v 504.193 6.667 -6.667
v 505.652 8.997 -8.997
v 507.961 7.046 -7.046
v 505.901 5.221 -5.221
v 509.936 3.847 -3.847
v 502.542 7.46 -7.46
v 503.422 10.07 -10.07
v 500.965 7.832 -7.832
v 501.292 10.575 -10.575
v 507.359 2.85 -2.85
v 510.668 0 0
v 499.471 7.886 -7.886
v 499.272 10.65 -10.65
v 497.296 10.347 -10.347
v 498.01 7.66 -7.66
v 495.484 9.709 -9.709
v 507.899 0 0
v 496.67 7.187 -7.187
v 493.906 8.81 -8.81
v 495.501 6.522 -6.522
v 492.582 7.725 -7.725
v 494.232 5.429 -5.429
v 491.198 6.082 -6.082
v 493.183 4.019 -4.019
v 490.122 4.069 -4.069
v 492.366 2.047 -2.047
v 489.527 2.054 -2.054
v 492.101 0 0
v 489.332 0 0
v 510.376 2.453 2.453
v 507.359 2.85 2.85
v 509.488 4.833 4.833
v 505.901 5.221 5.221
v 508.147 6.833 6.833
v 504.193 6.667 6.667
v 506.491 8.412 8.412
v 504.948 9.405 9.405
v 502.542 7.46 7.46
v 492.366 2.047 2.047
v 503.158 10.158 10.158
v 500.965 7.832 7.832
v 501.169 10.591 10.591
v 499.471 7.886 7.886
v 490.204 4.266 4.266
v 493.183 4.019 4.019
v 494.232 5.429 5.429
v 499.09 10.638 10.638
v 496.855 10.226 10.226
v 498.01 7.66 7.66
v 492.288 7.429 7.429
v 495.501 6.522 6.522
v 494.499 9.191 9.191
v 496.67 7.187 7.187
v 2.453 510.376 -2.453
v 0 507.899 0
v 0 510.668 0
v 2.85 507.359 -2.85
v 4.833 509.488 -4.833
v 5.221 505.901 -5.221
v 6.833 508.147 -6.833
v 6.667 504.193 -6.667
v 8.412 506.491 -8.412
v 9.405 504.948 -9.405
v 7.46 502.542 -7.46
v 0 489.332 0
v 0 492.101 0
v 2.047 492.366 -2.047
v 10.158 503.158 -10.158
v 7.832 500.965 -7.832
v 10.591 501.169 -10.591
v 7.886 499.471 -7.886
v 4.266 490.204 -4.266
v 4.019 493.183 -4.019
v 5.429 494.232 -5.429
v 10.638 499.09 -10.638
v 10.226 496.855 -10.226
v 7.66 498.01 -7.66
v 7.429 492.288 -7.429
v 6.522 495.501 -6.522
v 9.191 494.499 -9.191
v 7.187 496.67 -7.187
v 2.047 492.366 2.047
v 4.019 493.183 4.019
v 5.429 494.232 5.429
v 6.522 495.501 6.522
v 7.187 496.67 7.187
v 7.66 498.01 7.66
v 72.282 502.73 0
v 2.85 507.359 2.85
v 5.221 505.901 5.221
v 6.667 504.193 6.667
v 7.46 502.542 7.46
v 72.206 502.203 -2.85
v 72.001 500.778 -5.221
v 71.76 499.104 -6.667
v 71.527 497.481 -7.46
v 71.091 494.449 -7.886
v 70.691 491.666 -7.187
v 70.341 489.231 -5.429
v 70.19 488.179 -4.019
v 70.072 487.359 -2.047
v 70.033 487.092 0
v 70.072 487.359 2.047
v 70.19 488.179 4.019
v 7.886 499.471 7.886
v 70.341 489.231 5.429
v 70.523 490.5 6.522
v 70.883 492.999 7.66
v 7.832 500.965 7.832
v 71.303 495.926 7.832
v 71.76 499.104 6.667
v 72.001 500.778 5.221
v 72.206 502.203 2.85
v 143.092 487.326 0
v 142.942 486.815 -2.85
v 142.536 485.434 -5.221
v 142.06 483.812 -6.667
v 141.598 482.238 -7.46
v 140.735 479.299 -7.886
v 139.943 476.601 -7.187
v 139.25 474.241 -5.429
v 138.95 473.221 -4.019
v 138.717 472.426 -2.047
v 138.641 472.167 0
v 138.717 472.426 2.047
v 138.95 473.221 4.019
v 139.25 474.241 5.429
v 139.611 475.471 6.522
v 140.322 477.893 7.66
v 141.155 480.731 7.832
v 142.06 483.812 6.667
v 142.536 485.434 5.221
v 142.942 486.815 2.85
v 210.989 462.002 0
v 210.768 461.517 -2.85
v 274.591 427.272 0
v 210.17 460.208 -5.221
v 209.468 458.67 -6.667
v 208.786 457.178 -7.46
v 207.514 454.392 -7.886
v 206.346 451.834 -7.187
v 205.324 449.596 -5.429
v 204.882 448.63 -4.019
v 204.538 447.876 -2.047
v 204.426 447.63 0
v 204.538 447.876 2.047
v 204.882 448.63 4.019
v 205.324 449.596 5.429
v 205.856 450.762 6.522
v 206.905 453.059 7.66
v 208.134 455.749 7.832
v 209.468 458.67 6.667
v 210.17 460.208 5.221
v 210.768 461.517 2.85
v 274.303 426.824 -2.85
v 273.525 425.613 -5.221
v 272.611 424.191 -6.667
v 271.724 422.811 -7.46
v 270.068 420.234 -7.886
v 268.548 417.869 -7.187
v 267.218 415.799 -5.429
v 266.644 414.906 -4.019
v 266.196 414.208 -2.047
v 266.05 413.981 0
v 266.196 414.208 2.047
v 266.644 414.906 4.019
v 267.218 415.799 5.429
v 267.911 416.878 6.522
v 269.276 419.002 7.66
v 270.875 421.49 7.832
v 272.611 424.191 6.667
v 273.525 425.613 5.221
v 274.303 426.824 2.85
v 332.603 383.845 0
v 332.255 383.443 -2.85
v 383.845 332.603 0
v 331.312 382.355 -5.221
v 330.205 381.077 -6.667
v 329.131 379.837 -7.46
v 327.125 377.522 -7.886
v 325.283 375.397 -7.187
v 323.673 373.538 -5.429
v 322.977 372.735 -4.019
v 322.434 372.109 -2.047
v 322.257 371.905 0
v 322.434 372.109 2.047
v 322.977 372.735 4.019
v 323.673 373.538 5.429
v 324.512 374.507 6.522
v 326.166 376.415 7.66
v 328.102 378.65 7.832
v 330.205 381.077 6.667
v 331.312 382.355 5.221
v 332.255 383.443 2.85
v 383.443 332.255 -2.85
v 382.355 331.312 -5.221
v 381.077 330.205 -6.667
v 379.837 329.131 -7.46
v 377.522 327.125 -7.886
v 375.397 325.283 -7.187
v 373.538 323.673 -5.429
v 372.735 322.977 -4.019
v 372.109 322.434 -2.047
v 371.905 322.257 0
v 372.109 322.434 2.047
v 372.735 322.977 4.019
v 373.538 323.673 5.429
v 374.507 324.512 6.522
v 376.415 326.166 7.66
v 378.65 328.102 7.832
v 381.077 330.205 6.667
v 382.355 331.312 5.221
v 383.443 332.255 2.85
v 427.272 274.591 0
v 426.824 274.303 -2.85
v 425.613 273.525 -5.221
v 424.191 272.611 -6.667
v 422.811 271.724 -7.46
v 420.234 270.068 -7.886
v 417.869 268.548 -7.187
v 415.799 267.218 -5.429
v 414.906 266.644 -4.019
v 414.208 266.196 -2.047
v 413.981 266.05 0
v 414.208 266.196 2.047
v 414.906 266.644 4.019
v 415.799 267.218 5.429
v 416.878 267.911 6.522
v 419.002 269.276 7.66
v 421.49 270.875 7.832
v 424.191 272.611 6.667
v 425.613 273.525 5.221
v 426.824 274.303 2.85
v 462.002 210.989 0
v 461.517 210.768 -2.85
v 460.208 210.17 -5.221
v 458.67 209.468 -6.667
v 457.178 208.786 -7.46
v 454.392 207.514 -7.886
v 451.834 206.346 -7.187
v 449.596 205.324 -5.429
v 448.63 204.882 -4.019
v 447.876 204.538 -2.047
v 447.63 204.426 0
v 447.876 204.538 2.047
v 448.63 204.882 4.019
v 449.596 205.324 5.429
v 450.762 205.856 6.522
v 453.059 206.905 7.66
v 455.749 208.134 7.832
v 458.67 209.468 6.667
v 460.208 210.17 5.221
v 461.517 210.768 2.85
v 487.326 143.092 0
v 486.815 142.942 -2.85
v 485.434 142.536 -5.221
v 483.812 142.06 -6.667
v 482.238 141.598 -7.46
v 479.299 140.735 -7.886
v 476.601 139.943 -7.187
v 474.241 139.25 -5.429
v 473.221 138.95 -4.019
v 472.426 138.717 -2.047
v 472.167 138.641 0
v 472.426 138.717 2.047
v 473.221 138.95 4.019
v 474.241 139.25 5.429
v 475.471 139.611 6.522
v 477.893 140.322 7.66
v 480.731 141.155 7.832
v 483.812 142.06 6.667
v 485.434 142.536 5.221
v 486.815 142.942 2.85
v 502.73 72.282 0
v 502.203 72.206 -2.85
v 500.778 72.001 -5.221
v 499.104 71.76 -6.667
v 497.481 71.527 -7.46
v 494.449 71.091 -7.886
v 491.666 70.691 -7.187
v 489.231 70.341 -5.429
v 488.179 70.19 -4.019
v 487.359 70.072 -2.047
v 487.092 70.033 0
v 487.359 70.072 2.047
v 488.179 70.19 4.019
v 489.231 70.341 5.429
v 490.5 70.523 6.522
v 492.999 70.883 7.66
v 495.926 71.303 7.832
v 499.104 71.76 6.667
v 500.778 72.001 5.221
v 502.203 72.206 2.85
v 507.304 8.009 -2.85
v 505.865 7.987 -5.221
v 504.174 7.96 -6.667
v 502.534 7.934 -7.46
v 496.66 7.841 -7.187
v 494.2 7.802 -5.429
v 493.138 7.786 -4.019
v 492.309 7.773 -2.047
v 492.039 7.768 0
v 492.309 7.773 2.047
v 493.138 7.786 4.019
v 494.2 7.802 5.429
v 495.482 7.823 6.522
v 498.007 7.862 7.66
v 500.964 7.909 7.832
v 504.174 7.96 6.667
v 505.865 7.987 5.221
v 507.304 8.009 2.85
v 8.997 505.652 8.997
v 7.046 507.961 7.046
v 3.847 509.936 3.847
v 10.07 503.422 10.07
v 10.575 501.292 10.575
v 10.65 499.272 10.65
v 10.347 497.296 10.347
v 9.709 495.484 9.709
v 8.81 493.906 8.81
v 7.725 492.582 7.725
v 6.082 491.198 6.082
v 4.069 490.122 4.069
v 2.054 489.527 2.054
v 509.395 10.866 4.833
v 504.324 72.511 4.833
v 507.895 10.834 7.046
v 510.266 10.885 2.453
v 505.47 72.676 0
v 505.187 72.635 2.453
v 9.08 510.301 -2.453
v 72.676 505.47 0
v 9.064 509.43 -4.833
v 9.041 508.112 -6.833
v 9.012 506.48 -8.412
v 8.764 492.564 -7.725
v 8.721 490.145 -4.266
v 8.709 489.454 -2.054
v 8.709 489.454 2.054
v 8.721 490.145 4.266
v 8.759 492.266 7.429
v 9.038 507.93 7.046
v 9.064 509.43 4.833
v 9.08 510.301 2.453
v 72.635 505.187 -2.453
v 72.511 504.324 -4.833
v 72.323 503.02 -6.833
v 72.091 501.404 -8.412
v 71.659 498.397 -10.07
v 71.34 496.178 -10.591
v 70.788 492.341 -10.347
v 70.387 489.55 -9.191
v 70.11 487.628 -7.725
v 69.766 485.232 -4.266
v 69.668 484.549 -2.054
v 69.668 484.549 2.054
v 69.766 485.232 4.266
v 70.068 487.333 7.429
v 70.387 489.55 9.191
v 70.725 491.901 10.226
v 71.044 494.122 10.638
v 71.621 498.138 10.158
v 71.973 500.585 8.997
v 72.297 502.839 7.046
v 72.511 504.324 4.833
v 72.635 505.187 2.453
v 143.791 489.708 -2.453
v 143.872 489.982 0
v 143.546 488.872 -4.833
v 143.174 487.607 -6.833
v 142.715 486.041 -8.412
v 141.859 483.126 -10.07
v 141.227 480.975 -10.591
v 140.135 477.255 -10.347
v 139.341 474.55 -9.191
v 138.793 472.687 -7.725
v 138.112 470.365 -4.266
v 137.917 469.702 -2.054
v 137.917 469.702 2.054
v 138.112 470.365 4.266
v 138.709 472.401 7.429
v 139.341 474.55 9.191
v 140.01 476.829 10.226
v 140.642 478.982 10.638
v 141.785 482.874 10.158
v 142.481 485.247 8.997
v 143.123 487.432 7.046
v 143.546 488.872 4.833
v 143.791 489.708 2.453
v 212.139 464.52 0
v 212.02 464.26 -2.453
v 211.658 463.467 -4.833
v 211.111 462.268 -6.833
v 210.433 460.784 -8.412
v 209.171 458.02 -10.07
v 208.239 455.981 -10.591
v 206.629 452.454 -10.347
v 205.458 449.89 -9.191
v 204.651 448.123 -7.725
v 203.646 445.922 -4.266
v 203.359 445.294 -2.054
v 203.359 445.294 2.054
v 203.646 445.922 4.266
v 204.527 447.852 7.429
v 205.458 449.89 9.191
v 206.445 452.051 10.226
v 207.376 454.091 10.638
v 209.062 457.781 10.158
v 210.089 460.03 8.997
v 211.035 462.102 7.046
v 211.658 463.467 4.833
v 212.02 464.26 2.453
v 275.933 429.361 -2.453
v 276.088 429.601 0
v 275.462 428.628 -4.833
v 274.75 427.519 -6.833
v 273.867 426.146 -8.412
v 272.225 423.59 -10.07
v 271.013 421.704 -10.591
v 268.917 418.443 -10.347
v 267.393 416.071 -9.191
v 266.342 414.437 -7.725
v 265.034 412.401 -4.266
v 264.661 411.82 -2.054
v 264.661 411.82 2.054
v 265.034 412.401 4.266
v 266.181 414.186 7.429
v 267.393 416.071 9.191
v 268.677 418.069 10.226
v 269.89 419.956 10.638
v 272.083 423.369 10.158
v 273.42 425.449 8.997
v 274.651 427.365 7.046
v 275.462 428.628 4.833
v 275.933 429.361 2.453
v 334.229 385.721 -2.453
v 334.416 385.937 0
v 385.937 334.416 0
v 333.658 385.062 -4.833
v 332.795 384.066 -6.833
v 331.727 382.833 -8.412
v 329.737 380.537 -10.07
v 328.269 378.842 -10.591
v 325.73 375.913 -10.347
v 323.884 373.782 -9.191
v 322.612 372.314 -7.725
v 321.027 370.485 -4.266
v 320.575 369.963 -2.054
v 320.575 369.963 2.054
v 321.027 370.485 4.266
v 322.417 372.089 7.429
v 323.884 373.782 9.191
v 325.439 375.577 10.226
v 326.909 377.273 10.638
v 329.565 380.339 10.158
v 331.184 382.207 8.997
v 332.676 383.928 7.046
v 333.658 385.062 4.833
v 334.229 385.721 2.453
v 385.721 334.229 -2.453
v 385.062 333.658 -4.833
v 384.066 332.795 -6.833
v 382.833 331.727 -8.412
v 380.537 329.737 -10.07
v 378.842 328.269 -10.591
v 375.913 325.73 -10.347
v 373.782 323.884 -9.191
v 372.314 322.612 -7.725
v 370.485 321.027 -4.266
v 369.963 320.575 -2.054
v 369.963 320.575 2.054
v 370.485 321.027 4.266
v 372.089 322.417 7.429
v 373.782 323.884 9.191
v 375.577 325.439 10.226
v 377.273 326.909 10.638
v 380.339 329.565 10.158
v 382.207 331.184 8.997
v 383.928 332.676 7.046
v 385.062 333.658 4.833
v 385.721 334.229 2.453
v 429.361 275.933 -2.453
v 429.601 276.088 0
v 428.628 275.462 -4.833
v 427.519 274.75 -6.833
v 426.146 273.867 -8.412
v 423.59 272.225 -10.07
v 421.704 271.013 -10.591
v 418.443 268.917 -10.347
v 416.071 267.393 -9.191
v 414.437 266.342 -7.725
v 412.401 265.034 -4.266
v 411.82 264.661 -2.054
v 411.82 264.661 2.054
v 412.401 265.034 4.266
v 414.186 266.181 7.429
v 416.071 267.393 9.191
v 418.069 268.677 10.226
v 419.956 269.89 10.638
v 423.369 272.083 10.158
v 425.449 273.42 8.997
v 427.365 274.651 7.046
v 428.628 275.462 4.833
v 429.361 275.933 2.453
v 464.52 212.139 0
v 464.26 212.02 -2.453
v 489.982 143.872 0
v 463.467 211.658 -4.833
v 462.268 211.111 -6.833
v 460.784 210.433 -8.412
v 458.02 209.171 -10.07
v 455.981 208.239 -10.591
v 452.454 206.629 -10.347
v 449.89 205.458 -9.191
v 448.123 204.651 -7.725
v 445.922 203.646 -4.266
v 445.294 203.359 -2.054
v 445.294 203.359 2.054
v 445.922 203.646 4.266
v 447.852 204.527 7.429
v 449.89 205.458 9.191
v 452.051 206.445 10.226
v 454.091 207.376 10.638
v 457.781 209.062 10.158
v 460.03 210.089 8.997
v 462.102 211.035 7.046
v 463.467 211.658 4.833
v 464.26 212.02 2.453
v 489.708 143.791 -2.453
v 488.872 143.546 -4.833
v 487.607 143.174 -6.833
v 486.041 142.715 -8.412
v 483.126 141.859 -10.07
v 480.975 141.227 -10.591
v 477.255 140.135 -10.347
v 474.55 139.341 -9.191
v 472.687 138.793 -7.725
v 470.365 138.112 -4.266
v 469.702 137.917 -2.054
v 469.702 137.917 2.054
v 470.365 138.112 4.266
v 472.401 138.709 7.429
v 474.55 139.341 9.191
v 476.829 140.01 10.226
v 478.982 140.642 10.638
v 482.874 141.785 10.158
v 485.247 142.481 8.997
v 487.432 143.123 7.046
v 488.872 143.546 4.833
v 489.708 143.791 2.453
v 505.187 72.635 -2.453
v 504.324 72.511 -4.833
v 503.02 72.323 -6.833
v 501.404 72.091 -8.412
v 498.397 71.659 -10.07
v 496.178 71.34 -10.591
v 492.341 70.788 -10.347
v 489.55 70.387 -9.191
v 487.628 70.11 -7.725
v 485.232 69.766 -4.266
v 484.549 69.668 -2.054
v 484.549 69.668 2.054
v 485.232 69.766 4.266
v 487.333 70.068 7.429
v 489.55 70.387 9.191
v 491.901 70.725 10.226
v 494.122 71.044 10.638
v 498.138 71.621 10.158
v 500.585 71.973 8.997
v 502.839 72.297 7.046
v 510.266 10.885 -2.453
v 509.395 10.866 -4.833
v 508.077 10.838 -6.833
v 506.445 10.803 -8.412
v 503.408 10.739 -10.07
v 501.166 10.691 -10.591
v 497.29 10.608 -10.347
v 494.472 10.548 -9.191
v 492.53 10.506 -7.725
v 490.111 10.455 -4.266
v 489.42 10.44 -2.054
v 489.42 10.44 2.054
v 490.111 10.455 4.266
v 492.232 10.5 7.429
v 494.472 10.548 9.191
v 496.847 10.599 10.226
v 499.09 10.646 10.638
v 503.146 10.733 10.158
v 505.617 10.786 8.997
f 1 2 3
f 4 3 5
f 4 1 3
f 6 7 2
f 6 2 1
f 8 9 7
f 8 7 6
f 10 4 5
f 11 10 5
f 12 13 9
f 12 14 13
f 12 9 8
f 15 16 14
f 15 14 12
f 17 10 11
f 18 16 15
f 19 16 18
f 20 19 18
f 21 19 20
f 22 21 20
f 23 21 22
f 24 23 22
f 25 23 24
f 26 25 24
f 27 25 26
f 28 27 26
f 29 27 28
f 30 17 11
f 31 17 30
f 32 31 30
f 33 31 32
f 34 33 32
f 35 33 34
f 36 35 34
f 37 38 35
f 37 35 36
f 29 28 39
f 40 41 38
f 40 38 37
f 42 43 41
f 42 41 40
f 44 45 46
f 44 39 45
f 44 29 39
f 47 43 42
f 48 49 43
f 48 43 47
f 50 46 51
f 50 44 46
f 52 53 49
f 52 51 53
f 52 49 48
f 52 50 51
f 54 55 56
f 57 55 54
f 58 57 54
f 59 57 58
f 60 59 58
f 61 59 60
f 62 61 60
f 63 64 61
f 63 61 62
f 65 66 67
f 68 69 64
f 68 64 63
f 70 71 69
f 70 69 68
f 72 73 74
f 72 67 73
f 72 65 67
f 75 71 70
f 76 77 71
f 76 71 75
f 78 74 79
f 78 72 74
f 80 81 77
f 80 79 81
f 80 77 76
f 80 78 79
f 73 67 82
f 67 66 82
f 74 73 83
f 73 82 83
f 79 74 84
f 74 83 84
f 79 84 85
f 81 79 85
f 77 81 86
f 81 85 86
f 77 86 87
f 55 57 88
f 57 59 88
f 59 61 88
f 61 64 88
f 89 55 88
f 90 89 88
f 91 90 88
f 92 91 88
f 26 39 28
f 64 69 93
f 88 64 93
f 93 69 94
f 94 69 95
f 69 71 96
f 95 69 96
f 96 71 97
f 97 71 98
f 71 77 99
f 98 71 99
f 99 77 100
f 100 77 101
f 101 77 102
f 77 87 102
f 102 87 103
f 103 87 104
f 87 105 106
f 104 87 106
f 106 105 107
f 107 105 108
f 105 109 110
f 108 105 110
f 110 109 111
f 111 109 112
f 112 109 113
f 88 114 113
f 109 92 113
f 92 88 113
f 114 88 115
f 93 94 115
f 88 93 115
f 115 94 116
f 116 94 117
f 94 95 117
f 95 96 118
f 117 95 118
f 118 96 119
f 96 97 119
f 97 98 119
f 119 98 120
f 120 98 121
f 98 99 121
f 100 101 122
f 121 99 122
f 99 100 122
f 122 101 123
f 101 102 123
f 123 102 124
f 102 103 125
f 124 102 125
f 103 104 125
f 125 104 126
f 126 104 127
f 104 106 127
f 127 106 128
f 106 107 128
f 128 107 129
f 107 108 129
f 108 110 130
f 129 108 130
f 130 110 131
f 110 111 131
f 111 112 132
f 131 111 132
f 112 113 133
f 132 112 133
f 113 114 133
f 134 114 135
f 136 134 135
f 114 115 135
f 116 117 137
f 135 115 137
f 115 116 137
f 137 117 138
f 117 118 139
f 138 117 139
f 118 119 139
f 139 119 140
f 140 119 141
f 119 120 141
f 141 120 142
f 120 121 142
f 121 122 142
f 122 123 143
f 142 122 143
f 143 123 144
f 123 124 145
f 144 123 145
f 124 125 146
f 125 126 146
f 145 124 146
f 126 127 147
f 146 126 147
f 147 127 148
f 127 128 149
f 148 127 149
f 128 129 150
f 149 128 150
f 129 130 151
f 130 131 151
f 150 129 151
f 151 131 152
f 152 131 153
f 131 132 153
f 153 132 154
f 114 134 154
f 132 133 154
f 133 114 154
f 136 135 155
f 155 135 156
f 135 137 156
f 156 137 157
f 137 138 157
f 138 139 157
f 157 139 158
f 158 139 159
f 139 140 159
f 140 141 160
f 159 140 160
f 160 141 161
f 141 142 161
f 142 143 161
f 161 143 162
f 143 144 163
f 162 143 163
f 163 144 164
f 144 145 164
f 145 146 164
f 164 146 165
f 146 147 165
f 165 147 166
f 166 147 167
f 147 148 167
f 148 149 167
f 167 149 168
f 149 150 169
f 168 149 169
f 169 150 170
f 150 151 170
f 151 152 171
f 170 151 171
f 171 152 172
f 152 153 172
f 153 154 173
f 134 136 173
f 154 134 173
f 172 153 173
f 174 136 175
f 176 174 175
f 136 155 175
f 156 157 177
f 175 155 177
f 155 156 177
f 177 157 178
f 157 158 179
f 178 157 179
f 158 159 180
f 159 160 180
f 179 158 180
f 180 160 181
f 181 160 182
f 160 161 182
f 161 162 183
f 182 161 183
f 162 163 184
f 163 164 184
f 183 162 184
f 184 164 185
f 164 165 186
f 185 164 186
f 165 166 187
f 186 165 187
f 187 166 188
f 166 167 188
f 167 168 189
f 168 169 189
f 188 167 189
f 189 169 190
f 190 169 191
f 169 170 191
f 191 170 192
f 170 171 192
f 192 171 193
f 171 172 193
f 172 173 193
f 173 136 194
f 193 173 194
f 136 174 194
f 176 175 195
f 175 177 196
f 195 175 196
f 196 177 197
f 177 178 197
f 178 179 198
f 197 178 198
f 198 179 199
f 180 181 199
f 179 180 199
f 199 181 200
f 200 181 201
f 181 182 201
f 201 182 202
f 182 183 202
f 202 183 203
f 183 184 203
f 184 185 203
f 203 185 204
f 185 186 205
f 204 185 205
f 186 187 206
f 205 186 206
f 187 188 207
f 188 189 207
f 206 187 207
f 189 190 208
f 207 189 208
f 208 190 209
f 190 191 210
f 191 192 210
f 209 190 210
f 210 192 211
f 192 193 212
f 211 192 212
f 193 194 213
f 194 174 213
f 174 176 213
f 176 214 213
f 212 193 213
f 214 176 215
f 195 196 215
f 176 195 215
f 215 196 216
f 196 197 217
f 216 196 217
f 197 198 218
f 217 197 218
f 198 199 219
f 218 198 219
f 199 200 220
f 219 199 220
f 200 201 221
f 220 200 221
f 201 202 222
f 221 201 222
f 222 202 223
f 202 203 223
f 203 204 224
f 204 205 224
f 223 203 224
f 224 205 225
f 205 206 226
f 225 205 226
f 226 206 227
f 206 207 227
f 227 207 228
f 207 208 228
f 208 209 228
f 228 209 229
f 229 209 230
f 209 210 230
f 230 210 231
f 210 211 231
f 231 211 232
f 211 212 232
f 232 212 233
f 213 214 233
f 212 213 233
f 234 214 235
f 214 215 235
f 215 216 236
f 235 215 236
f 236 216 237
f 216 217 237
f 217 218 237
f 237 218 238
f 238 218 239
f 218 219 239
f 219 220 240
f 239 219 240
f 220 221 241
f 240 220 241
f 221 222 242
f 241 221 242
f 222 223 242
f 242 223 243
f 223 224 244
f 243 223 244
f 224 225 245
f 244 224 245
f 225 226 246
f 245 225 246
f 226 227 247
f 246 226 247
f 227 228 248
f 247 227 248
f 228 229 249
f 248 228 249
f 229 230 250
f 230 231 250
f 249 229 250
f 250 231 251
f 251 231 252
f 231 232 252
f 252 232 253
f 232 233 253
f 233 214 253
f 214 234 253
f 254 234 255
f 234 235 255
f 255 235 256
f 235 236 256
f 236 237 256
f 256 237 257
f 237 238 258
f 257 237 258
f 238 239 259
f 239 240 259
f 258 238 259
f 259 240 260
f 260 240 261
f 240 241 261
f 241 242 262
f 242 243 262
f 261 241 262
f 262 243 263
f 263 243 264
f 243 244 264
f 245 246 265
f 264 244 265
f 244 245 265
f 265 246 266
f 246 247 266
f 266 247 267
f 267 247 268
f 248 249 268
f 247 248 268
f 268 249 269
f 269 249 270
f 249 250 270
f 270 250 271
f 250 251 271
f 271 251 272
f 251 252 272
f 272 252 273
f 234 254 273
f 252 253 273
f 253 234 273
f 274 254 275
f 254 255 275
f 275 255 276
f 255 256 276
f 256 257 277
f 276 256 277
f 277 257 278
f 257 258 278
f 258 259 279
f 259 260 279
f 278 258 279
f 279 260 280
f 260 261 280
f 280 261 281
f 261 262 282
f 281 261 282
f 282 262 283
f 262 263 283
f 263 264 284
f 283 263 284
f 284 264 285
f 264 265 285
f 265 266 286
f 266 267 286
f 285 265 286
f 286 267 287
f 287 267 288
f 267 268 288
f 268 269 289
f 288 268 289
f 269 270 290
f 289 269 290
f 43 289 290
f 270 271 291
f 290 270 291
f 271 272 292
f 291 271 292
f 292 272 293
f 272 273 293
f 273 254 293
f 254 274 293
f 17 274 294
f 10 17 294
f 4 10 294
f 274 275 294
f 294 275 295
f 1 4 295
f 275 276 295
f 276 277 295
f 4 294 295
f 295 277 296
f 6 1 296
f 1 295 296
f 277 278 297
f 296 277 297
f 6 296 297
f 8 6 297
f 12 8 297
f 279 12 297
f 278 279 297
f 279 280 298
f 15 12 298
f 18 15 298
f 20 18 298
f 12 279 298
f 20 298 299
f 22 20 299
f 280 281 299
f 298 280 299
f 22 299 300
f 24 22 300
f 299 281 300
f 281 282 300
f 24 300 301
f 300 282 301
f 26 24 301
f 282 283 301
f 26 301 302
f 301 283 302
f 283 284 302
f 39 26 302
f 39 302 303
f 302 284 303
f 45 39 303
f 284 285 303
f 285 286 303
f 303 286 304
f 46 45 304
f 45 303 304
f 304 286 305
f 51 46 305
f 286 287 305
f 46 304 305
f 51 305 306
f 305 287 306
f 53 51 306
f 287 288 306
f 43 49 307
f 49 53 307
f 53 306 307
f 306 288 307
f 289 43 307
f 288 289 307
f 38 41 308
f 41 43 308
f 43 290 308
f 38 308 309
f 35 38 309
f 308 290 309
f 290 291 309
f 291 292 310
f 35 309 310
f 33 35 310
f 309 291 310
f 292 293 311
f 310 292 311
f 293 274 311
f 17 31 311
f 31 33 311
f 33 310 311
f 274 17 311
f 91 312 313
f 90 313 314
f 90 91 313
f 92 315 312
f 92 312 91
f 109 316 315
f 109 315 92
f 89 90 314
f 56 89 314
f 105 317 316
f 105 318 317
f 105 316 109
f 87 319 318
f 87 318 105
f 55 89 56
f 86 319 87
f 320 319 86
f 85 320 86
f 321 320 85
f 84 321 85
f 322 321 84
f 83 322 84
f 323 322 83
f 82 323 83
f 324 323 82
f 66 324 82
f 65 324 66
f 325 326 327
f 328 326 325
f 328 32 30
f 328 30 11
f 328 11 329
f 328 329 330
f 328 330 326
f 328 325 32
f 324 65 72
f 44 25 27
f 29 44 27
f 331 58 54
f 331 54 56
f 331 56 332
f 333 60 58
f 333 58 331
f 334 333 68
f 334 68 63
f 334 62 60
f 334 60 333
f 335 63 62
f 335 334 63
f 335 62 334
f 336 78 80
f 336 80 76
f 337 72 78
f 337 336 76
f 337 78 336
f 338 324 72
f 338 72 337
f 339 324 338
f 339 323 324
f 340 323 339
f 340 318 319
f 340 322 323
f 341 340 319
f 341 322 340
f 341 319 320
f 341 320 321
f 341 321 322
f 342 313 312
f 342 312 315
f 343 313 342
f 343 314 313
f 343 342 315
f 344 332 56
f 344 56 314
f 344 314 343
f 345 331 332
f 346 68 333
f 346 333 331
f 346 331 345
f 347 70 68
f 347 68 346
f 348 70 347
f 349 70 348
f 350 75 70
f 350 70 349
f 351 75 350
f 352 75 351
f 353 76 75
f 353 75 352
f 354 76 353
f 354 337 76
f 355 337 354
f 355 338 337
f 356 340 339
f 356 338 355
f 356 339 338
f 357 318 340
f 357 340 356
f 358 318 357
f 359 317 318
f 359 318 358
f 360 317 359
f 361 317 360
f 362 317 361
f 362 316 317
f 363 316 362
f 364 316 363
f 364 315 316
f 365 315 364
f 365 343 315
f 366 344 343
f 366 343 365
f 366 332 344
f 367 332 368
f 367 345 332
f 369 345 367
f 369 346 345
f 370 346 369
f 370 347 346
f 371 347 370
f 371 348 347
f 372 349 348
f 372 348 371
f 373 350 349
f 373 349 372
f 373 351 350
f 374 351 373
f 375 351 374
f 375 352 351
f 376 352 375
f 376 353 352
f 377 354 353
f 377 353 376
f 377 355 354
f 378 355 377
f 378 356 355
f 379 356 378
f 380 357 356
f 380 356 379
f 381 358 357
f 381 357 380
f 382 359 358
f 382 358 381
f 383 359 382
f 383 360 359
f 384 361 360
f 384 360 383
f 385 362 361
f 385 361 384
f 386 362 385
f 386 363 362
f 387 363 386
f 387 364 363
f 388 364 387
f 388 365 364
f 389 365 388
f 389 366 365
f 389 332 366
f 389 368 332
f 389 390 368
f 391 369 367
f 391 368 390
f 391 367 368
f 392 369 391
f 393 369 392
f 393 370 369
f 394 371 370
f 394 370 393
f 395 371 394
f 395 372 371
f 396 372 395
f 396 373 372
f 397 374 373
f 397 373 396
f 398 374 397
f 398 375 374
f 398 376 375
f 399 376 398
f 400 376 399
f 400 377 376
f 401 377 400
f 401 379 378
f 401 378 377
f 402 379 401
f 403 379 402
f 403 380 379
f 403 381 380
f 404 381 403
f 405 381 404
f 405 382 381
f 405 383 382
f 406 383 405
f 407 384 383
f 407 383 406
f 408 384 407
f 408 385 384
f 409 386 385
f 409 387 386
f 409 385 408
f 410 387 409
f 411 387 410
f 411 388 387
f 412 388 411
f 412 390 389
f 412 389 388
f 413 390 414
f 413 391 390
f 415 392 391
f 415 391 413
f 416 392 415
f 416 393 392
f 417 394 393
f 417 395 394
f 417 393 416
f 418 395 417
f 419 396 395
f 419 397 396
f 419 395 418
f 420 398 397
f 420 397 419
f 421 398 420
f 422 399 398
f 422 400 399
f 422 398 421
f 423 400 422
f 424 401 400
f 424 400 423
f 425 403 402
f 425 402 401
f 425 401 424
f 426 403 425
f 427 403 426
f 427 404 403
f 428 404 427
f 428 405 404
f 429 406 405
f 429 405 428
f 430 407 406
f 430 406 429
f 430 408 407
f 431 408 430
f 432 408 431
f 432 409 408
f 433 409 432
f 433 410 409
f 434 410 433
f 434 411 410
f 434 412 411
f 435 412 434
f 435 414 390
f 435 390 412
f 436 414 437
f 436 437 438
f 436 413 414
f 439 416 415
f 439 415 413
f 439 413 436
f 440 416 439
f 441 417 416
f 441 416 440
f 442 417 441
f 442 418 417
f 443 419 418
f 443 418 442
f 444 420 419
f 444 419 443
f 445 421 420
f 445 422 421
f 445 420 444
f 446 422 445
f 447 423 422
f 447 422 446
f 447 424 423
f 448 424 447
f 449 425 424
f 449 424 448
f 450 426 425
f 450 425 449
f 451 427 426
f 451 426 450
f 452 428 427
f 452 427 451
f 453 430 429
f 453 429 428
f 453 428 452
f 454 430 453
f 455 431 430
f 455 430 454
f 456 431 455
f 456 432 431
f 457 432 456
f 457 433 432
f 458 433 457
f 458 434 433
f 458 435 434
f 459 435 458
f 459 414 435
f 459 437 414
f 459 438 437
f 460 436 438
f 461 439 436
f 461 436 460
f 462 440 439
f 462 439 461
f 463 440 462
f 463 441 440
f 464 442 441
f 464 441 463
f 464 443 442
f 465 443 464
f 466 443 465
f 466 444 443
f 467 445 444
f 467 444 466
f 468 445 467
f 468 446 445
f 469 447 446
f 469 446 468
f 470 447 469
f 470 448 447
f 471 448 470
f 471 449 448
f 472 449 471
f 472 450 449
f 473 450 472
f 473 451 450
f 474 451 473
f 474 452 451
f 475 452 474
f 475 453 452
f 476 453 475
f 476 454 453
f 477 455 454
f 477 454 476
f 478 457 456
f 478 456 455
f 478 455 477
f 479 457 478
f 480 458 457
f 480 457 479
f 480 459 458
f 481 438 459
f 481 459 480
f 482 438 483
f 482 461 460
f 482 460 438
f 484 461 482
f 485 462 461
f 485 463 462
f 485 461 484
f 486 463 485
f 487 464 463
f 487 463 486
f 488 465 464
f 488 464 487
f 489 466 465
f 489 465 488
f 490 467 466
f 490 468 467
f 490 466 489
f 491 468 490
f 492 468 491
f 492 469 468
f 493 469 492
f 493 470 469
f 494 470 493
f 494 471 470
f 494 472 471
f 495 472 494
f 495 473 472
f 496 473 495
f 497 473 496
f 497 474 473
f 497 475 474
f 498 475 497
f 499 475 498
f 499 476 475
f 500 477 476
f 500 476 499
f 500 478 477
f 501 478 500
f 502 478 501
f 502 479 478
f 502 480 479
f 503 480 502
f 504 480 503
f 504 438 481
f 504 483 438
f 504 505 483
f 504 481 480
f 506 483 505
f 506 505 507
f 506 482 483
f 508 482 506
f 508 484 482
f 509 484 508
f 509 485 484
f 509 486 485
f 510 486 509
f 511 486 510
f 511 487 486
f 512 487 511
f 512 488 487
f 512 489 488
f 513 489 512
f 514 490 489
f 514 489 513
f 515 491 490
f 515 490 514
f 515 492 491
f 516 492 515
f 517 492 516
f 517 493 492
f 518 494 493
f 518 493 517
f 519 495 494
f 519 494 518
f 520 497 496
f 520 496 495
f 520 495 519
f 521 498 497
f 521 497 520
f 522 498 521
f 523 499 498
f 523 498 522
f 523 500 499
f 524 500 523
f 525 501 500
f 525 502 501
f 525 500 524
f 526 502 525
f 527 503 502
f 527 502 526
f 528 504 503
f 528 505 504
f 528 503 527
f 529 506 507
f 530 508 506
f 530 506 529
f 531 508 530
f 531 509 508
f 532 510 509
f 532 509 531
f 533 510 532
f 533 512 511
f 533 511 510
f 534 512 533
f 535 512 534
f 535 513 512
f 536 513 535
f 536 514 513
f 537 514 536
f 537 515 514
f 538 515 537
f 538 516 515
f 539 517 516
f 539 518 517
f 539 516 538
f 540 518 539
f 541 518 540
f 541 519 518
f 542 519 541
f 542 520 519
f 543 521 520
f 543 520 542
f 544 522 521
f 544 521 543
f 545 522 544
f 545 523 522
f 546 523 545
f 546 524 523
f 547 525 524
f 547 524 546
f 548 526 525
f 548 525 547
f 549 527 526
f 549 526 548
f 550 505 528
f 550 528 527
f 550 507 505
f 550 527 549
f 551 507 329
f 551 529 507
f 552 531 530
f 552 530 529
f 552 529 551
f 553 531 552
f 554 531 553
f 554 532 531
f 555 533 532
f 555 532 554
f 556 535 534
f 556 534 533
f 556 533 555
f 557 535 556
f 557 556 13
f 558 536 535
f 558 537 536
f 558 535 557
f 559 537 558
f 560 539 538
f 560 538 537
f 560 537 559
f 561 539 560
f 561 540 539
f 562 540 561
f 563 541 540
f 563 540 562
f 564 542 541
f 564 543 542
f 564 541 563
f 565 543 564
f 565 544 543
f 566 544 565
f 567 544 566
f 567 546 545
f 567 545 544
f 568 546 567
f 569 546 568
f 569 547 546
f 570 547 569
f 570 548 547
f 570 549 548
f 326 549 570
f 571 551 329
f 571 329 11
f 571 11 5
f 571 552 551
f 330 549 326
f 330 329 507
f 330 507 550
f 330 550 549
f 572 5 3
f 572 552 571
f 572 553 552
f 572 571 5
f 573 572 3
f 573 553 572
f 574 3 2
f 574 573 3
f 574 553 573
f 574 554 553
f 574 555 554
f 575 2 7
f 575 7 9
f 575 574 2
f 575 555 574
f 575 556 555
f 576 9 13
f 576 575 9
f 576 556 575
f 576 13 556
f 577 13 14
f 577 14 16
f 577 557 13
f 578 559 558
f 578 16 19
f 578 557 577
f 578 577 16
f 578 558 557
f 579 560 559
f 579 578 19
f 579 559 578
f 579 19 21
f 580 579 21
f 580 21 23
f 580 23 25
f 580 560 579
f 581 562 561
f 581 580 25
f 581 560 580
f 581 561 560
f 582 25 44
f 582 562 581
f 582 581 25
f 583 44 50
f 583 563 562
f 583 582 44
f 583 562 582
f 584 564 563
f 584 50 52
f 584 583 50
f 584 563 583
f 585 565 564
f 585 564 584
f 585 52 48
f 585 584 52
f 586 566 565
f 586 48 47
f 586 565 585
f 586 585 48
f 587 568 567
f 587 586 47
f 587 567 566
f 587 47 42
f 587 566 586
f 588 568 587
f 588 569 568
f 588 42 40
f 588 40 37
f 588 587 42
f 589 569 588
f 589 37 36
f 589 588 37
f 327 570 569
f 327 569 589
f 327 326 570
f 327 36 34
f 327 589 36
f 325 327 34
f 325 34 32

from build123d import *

# Parameters (mm, degrees)
SKETCH2_R          = 10.668
SKETCH2_R_2        = 7.8994
CUT_EXTRUDE2_DEPTH = 723.272399361
CUT_EXTRUDE4_START = 489.220558
CUT_EXTRUDE4_DEPTH = 21.447442


with BuildPart() as part:
    # Sweep1: sweep along a path in Sketch1
    with BuildLine(Plane.XY) as sweep1_path:
        ThreePointArc((0, 500), (353.553390593, 353.553390593), (500, 0))
    # Sketch2 → Sweep1 (sweep)
    with BuildSketch(Plane(origin=(0, 0, 0), x_dir=(1, 0, 0), z_dir=(0, 1, 0))):
        with Locations((500, 0)):
            Circle(SKETCH2_R)
        with Locations((500, 0)):
            Circle(SKETCH2_R_2, mode=Mode.SUBTRACT)
    sweep(path=sweep1_path.line)

    # Sketch4 → Cut-Extrude2 (cut, through all)
    with BuildSketch(Plane(origin=(0, 0, 0), x_dir=(0, 0, -1), z_dir=(1, 0, 0))):
        Polygon((0, 0), (-10.668, 10.668), (-10.668, -2.04612568), (10.668, -2.04612568), (10.668, 10.668), align=None)
    extrude(amount=CUT_EXTRUDE2_DEPTH, mode=Mode.SUBTRACT)

    # Sketch3 → Cut-Extrude4 (cut)
    with BuildSketch(Plane(origin=(0, 0, 0), x_dir=(1, 0, 0), z_dir=(0, 1, 0)).offset(CUT_EXTRUDE4_START)):
        Polygon((0, 0), (10.668, 10.668), (-11.575334071, 10.668), (-11.575334071, -10.668), (10.668, -10.668), align=None)
    extrude(amount=CUT_EXTRUDE4_DEPTH, mode=Mode.SUBTRACT)


solid = part.part
